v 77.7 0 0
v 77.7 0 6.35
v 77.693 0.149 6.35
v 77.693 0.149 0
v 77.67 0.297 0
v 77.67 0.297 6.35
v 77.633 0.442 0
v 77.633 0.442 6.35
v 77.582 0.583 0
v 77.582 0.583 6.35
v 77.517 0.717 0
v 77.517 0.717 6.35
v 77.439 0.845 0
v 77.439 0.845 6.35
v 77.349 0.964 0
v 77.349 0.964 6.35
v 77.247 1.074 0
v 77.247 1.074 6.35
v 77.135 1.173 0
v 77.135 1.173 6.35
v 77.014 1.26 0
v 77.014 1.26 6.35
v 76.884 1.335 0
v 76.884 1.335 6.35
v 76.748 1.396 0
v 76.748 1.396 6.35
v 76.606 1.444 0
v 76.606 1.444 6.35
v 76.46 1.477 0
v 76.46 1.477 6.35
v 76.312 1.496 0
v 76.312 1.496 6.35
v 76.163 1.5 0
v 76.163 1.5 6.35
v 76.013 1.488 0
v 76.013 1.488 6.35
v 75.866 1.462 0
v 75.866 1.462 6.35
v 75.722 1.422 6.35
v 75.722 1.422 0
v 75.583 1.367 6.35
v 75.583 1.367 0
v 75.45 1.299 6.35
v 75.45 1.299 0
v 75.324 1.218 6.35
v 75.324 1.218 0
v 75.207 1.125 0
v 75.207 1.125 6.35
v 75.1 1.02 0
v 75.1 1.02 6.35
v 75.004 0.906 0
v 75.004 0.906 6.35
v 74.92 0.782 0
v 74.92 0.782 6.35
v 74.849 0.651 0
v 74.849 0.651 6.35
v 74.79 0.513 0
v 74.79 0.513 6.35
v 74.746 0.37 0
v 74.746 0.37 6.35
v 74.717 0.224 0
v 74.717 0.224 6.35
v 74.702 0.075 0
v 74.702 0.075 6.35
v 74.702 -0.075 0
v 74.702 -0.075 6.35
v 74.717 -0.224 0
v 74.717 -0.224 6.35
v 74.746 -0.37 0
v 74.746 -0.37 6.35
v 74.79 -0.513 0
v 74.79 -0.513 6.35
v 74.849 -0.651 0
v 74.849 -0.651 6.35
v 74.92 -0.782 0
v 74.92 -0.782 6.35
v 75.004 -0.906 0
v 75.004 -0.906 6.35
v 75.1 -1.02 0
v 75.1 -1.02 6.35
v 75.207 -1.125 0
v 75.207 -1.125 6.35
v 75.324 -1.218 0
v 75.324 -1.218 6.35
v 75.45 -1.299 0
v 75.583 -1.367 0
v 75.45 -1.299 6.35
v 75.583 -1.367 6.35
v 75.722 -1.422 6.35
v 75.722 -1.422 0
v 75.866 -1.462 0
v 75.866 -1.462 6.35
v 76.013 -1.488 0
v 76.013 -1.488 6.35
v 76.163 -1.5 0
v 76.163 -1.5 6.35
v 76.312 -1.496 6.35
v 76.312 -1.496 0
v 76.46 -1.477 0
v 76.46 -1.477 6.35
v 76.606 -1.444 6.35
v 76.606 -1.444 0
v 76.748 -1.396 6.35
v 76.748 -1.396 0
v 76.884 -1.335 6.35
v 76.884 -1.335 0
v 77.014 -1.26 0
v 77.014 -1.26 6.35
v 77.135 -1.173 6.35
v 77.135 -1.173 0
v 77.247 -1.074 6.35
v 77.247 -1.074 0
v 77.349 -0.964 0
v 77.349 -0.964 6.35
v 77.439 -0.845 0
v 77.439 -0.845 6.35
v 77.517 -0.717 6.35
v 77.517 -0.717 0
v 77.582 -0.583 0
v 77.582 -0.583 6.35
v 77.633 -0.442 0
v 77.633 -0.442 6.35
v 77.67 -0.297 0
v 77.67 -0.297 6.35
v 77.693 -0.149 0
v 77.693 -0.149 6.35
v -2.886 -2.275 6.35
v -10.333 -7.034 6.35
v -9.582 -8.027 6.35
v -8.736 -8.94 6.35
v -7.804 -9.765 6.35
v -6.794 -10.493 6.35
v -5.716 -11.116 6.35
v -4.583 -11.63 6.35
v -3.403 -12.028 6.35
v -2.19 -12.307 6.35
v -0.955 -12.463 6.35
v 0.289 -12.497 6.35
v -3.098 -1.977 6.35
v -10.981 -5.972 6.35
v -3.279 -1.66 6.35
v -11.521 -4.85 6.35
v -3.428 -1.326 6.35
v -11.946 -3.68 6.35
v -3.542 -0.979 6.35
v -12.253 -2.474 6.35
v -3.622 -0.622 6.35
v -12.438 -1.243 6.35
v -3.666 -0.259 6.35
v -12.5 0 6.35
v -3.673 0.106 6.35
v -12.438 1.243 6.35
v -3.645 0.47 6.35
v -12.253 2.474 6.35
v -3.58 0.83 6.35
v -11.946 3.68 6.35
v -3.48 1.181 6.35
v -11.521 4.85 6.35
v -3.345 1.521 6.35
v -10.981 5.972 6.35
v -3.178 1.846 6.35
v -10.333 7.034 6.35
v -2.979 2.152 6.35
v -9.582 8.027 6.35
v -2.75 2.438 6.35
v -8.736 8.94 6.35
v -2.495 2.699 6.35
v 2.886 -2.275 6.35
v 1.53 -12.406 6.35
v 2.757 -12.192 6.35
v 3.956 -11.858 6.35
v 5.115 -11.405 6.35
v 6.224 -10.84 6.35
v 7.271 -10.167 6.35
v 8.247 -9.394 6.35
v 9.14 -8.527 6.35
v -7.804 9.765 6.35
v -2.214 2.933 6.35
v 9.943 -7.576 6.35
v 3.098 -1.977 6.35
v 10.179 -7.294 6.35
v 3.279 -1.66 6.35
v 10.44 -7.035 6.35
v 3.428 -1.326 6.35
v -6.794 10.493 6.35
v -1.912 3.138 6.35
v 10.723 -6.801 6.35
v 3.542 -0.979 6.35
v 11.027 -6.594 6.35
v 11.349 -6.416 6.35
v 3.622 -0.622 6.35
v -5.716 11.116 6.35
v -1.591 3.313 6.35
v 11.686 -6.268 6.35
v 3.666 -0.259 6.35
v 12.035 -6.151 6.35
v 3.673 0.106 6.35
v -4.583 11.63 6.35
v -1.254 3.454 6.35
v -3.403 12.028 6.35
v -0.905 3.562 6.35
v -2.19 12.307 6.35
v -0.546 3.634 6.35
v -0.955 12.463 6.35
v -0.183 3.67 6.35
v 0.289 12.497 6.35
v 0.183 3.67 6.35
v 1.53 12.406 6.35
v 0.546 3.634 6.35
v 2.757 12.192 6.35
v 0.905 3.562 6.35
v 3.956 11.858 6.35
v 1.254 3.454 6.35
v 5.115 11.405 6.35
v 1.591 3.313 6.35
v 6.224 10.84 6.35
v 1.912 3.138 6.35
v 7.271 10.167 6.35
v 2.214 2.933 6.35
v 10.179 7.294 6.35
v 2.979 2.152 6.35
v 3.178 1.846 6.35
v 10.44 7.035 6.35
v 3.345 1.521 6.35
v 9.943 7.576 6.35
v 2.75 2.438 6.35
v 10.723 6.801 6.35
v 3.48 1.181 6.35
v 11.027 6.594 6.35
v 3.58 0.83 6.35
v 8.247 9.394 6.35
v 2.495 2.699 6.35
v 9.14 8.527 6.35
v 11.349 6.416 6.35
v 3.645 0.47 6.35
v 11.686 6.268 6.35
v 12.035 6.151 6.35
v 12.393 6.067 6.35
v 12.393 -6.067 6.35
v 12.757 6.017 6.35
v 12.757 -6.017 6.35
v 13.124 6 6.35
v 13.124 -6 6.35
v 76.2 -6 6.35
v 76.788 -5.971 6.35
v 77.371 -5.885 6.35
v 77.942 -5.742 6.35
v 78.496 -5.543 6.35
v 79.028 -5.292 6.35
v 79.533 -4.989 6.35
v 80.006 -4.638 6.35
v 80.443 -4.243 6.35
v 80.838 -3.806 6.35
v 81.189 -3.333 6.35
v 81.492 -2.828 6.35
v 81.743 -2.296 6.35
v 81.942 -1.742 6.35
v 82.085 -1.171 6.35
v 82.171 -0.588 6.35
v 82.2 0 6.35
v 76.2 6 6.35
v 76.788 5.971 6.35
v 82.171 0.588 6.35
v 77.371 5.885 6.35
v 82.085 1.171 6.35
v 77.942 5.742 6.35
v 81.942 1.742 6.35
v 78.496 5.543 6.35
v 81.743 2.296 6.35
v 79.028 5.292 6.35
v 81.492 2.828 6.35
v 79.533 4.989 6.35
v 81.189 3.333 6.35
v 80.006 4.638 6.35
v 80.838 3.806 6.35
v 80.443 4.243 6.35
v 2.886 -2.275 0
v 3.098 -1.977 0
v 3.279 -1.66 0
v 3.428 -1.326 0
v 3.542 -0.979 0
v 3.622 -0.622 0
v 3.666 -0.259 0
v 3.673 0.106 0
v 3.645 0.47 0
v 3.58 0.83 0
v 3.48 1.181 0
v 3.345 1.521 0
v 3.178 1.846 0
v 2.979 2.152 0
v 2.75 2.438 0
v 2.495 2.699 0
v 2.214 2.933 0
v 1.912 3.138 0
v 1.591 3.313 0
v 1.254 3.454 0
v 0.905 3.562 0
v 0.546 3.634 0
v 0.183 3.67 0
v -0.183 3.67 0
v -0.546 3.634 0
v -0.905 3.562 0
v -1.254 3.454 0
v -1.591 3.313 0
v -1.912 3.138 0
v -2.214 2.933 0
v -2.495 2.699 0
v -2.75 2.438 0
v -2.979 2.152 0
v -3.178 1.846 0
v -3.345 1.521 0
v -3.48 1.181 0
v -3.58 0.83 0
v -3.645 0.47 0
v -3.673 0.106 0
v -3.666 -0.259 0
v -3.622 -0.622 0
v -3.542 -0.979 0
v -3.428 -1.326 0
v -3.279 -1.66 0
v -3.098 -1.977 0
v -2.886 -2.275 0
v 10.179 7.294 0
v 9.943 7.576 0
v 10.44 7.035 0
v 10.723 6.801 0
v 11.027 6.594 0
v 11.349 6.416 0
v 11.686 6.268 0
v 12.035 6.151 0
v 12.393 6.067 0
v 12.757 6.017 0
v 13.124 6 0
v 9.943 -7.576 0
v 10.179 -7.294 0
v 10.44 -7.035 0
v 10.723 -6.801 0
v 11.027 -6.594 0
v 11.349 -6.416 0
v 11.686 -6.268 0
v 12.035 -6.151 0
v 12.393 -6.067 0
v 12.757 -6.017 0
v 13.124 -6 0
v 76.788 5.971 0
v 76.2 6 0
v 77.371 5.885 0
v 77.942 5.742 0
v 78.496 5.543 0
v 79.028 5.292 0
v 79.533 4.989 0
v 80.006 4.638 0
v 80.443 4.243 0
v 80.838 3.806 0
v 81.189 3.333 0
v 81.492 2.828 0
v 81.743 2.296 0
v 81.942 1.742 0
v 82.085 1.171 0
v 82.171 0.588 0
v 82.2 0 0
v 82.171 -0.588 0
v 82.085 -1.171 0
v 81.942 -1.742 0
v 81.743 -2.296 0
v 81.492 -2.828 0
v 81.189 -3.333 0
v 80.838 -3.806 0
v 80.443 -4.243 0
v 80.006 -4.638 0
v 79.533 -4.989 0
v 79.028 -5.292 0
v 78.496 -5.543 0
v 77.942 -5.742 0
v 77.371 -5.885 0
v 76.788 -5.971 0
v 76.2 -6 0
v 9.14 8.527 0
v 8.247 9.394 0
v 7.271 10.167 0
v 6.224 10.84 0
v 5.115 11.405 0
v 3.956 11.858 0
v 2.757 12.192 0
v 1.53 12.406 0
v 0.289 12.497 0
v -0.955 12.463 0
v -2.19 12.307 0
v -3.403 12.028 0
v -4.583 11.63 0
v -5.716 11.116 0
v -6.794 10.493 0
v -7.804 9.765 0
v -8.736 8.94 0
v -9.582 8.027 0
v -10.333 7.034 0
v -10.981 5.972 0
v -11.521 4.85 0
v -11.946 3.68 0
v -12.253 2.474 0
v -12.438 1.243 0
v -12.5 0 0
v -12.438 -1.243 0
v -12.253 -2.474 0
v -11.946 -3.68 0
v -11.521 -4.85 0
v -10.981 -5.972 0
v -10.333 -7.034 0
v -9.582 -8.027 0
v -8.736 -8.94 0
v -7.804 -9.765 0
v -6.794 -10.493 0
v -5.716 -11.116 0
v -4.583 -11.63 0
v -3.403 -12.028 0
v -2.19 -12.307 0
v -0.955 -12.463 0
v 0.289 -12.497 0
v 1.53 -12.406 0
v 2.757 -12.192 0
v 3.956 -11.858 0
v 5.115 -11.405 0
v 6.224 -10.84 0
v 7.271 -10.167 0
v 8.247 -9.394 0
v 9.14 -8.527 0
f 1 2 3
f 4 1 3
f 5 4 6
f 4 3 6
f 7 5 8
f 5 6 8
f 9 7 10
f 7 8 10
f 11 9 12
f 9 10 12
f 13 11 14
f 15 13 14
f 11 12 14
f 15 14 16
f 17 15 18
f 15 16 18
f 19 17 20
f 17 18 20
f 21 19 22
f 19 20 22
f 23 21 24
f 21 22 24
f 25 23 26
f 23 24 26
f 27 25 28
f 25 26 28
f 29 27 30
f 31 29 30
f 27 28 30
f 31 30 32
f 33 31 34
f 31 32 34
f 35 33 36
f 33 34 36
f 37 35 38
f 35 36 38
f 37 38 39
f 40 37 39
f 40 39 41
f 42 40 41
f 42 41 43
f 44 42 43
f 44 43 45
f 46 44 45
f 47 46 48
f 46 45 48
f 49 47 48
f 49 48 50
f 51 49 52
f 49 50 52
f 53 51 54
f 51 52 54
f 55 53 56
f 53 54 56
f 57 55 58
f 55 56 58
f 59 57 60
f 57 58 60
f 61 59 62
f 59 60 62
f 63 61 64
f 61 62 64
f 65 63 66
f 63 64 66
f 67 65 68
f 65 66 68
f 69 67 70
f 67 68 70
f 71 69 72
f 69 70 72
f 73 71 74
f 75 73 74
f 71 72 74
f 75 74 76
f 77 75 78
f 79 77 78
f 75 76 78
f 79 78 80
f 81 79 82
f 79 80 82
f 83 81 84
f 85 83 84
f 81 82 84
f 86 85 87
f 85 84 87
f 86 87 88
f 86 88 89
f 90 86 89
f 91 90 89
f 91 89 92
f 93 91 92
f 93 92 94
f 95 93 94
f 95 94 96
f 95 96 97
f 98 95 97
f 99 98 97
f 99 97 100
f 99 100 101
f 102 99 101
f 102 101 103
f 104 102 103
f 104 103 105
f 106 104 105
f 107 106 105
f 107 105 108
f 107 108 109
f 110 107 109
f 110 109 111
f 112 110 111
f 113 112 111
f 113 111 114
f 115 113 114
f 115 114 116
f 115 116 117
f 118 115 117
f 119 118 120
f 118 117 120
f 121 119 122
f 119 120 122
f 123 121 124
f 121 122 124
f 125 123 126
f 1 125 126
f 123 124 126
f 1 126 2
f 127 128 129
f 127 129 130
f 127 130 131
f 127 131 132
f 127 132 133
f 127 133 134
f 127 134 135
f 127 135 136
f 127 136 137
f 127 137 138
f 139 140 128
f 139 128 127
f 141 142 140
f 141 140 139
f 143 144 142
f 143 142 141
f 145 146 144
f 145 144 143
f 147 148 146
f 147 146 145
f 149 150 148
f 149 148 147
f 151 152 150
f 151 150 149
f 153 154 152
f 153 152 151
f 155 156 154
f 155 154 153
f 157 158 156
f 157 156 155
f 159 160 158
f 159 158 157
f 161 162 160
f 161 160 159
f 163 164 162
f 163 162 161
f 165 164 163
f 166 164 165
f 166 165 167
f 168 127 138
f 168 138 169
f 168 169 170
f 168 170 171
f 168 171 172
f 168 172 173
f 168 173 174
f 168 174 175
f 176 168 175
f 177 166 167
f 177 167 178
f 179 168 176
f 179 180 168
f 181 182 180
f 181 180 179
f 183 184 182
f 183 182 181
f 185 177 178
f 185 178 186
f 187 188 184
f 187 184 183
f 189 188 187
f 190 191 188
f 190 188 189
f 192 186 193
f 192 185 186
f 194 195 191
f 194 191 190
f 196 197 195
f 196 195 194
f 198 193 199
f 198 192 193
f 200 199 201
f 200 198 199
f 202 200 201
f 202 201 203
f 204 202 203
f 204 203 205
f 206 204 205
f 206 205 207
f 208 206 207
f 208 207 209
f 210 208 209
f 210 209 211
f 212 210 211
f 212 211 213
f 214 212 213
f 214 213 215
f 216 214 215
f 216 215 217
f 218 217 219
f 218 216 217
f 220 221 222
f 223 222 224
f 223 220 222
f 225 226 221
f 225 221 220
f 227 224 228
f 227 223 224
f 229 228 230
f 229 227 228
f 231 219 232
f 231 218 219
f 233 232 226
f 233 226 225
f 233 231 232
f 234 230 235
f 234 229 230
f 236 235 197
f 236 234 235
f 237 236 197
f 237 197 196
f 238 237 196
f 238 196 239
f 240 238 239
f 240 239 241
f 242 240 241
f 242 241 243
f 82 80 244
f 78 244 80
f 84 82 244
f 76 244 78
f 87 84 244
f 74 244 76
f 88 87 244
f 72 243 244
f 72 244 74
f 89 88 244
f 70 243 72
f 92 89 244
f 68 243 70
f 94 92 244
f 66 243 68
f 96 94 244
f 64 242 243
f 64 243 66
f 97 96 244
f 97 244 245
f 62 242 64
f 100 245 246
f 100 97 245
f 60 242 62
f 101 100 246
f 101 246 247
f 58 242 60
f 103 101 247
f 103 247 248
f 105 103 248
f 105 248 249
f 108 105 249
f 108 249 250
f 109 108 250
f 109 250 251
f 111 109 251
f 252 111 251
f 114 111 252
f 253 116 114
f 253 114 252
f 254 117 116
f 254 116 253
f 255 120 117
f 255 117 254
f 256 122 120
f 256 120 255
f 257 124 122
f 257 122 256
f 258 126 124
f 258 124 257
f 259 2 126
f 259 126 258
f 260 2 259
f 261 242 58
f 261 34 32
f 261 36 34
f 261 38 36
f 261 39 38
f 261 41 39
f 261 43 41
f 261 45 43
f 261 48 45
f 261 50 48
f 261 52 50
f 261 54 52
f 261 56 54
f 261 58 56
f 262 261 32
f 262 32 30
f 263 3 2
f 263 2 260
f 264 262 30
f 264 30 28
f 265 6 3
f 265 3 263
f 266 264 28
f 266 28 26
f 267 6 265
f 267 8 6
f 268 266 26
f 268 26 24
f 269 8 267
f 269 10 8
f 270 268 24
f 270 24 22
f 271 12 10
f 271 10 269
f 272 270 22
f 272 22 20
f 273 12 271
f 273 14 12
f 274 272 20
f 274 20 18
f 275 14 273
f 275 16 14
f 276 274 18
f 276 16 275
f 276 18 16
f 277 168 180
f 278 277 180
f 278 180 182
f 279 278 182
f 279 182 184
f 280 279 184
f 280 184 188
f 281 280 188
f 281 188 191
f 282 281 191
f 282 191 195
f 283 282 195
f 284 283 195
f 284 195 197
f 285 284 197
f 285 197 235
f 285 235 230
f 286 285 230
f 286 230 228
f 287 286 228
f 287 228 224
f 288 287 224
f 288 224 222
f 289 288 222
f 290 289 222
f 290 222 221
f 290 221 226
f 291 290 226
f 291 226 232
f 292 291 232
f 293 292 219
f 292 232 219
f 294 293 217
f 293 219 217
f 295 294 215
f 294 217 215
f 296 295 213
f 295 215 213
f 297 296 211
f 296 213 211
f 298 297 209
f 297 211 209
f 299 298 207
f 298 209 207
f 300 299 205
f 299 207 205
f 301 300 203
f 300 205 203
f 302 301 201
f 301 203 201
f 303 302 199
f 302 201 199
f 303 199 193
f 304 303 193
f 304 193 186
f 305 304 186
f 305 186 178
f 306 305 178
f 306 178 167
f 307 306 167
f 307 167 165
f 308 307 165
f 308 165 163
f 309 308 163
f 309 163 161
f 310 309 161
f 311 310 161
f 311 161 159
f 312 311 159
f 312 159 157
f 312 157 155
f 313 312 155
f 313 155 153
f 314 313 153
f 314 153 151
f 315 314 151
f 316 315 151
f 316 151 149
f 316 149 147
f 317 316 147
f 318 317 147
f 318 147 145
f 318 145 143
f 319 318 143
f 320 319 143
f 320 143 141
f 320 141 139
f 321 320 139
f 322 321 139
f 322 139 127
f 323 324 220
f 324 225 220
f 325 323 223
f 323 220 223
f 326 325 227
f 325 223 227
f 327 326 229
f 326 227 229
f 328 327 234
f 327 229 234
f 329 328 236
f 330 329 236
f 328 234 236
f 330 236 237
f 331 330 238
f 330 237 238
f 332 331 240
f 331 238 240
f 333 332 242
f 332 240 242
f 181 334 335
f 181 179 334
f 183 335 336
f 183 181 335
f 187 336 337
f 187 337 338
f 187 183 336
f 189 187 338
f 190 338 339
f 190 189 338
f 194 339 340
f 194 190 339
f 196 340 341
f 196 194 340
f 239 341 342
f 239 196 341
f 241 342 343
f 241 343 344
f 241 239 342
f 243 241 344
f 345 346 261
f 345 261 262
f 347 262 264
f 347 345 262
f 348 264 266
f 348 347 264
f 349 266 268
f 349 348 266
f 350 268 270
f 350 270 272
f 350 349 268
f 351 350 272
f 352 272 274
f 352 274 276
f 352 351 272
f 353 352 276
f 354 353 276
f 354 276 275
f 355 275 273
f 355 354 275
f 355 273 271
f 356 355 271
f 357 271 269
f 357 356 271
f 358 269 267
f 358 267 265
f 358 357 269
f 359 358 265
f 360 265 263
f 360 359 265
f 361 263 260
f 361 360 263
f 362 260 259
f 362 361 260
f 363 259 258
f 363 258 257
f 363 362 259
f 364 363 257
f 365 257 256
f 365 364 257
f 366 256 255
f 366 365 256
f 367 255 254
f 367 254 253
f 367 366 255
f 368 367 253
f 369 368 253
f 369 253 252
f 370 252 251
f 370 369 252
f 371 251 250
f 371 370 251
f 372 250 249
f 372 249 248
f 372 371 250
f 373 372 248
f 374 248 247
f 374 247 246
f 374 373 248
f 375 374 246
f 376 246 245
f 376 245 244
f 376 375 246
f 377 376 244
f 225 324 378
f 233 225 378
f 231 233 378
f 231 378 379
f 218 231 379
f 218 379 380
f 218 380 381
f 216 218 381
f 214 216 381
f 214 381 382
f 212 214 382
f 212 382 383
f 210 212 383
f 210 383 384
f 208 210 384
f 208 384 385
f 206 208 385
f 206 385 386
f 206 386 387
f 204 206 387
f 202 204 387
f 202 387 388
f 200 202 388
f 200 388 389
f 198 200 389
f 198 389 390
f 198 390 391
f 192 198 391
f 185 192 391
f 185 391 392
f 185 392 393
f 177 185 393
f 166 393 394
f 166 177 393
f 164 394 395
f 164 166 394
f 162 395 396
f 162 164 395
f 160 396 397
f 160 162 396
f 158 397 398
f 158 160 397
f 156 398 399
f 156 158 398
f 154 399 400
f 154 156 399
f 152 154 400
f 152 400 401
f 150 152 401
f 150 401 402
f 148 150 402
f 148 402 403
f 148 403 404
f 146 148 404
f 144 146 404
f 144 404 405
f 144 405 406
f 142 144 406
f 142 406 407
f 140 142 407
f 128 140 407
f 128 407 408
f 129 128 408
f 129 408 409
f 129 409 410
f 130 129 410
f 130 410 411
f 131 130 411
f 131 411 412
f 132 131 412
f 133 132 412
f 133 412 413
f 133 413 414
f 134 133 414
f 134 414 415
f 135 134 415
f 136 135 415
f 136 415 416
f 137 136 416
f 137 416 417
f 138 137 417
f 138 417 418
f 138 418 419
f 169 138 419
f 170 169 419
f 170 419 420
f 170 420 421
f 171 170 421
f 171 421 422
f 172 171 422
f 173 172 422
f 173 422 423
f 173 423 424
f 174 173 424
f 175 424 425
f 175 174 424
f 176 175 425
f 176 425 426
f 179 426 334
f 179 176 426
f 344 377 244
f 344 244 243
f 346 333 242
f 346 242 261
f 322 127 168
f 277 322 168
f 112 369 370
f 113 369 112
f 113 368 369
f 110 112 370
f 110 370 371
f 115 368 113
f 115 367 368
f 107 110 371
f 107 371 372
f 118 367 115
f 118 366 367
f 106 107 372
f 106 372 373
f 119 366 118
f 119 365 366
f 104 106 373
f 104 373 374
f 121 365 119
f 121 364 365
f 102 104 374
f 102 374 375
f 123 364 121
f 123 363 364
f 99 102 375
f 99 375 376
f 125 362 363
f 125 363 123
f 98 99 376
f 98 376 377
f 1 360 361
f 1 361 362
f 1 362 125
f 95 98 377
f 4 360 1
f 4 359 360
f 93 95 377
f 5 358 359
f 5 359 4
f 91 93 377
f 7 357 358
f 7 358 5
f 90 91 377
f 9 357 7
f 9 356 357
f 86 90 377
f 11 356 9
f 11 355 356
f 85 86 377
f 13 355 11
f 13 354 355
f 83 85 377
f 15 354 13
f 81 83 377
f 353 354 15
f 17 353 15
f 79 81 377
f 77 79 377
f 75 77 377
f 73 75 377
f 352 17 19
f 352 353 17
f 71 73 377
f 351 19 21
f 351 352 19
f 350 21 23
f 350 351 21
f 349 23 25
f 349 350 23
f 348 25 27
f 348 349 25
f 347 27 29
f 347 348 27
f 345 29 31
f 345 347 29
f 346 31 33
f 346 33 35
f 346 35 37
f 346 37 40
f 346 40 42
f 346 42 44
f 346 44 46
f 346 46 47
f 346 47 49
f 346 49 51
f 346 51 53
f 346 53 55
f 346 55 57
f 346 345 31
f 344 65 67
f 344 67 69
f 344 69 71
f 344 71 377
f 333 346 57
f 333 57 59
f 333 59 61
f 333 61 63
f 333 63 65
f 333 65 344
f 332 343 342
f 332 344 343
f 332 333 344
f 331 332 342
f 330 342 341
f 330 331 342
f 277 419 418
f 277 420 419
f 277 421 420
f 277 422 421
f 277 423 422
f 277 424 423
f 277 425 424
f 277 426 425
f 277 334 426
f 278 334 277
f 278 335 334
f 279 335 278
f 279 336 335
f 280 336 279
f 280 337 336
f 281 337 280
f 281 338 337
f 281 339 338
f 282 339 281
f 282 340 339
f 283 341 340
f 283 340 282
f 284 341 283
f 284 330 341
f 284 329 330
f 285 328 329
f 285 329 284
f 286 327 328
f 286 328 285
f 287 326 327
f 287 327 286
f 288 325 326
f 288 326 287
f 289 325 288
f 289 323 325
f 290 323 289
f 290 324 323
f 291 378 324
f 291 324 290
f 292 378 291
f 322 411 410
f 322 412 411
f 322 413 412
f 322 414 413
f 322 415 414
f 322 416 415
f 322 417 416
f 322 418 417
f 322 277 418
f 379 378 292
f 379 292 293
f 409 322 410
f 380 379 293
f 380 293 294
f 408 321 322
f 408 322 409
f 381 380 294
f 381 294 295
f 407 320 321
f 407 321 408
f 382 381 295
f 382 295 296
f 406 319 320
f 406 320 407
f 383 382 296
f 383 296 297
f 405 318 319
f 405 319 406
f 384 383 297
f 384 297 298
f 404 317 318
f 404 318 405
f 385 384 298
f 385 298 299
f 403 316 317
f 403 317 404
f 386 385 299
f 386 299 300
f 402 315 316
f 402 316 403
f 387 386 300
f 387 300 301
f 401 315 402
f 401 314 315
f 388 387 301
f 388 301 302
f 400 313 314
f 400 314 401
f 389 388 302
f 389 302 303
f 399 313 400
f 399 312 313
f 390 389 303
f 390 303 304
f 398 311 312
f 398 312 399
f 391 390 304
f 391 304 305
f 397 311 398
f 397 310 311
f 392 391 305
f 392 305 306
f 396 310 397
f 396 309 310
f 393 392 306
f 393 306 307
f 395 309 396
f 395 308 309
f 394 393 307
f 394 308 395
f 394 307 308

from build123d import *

# Parameters (mm, degrees)
BOSS_EXTRU_1_DEPTH      = 6.35
ESQUISSE4_R             = 12.5
BOSS_EXTRU_2_DEPTH      = 6.35
ENL_V_MAT_EXTRU_1_REACH = 85.387
ESQUISSE3_R             = 1.5
ENL_V_MAT_EXTRU_2_DEPTH = 6.35
CONG_1_R                = 4


with BuildPart() as part:
    # Esquisse1 → Boss.-Extru.1 (new body)
    with BuildSketch(Plane.XY):
        with BuildLine():
            Line((0, 6), (76.2, 6))
            ThreePointArc((76.2, 6), (82.2, 0), (76.2, -6))
            Line((76.2, -6), (0, -6))
            ThreePointArc((0, -6), (-6, 0), (0, 6))
        make_face()
    extrude(amount=BOSS_EXTRU_1_DEPTH)

    # Esquisse4 → Boss.-Extru.2 (add)
    with BuildSketch(Plane.XY.offset(6.35)):
        Circle(ESQUISSE4_R)
    extrude(amount=-BOSS_EXTRU_2_DEPTH)

    # Esquisse2 → Enlèv. mat.-Extru.1 (cut, up to next)
    with BuildSketch(Plane.XY.offset(6.35), mode=Mode.PRIVATE) as enl_v_mat_extru_1_sk1:
        with BuildLine():
            Line((-2.886173938, -2.275), (2.886173938, -2.275))
            ThreePointArc((2.886173938, -2.275), (0, 3.675), (-2.886173938, -2.275))
        make_face()
    enl_v_mat_extru_1_tool1 = extrude(enl_v_mat_extru_1_sk1.sketch, amount=-ENL_V_MAT_EXTRU_1_REACH, mode=Mode.PRIVATE) & part.part
    add(enl_v_mat_extru_1_tool1.solids().sort_by_distance((0, 0.435587, 6.35))[0], mode=Mode.SUBTRACT)

    # Esquisse3 → Enlèv. mat.-Extru.2 (cut)
    with BuildSketch(Plane.XY.offset(6.35)):
        with Locations((76.2, 0)):
            Circle(ESQUISSE3_R)
    extrude(amount=-ENL_V_MAT_EXTRU_2_DEPTH, mode=Mode.SUBTRACT)

    # Congé1
    cong_1_edges = [part.edges().sort_by_distance(p)[0] for p in [
        (10.9658561, -6, 3.175),
        (10.9658561, 6, 3.175),
    ]]
    fillet(cong_1_edges, radius=CONG_1_R)


solid = part.part
